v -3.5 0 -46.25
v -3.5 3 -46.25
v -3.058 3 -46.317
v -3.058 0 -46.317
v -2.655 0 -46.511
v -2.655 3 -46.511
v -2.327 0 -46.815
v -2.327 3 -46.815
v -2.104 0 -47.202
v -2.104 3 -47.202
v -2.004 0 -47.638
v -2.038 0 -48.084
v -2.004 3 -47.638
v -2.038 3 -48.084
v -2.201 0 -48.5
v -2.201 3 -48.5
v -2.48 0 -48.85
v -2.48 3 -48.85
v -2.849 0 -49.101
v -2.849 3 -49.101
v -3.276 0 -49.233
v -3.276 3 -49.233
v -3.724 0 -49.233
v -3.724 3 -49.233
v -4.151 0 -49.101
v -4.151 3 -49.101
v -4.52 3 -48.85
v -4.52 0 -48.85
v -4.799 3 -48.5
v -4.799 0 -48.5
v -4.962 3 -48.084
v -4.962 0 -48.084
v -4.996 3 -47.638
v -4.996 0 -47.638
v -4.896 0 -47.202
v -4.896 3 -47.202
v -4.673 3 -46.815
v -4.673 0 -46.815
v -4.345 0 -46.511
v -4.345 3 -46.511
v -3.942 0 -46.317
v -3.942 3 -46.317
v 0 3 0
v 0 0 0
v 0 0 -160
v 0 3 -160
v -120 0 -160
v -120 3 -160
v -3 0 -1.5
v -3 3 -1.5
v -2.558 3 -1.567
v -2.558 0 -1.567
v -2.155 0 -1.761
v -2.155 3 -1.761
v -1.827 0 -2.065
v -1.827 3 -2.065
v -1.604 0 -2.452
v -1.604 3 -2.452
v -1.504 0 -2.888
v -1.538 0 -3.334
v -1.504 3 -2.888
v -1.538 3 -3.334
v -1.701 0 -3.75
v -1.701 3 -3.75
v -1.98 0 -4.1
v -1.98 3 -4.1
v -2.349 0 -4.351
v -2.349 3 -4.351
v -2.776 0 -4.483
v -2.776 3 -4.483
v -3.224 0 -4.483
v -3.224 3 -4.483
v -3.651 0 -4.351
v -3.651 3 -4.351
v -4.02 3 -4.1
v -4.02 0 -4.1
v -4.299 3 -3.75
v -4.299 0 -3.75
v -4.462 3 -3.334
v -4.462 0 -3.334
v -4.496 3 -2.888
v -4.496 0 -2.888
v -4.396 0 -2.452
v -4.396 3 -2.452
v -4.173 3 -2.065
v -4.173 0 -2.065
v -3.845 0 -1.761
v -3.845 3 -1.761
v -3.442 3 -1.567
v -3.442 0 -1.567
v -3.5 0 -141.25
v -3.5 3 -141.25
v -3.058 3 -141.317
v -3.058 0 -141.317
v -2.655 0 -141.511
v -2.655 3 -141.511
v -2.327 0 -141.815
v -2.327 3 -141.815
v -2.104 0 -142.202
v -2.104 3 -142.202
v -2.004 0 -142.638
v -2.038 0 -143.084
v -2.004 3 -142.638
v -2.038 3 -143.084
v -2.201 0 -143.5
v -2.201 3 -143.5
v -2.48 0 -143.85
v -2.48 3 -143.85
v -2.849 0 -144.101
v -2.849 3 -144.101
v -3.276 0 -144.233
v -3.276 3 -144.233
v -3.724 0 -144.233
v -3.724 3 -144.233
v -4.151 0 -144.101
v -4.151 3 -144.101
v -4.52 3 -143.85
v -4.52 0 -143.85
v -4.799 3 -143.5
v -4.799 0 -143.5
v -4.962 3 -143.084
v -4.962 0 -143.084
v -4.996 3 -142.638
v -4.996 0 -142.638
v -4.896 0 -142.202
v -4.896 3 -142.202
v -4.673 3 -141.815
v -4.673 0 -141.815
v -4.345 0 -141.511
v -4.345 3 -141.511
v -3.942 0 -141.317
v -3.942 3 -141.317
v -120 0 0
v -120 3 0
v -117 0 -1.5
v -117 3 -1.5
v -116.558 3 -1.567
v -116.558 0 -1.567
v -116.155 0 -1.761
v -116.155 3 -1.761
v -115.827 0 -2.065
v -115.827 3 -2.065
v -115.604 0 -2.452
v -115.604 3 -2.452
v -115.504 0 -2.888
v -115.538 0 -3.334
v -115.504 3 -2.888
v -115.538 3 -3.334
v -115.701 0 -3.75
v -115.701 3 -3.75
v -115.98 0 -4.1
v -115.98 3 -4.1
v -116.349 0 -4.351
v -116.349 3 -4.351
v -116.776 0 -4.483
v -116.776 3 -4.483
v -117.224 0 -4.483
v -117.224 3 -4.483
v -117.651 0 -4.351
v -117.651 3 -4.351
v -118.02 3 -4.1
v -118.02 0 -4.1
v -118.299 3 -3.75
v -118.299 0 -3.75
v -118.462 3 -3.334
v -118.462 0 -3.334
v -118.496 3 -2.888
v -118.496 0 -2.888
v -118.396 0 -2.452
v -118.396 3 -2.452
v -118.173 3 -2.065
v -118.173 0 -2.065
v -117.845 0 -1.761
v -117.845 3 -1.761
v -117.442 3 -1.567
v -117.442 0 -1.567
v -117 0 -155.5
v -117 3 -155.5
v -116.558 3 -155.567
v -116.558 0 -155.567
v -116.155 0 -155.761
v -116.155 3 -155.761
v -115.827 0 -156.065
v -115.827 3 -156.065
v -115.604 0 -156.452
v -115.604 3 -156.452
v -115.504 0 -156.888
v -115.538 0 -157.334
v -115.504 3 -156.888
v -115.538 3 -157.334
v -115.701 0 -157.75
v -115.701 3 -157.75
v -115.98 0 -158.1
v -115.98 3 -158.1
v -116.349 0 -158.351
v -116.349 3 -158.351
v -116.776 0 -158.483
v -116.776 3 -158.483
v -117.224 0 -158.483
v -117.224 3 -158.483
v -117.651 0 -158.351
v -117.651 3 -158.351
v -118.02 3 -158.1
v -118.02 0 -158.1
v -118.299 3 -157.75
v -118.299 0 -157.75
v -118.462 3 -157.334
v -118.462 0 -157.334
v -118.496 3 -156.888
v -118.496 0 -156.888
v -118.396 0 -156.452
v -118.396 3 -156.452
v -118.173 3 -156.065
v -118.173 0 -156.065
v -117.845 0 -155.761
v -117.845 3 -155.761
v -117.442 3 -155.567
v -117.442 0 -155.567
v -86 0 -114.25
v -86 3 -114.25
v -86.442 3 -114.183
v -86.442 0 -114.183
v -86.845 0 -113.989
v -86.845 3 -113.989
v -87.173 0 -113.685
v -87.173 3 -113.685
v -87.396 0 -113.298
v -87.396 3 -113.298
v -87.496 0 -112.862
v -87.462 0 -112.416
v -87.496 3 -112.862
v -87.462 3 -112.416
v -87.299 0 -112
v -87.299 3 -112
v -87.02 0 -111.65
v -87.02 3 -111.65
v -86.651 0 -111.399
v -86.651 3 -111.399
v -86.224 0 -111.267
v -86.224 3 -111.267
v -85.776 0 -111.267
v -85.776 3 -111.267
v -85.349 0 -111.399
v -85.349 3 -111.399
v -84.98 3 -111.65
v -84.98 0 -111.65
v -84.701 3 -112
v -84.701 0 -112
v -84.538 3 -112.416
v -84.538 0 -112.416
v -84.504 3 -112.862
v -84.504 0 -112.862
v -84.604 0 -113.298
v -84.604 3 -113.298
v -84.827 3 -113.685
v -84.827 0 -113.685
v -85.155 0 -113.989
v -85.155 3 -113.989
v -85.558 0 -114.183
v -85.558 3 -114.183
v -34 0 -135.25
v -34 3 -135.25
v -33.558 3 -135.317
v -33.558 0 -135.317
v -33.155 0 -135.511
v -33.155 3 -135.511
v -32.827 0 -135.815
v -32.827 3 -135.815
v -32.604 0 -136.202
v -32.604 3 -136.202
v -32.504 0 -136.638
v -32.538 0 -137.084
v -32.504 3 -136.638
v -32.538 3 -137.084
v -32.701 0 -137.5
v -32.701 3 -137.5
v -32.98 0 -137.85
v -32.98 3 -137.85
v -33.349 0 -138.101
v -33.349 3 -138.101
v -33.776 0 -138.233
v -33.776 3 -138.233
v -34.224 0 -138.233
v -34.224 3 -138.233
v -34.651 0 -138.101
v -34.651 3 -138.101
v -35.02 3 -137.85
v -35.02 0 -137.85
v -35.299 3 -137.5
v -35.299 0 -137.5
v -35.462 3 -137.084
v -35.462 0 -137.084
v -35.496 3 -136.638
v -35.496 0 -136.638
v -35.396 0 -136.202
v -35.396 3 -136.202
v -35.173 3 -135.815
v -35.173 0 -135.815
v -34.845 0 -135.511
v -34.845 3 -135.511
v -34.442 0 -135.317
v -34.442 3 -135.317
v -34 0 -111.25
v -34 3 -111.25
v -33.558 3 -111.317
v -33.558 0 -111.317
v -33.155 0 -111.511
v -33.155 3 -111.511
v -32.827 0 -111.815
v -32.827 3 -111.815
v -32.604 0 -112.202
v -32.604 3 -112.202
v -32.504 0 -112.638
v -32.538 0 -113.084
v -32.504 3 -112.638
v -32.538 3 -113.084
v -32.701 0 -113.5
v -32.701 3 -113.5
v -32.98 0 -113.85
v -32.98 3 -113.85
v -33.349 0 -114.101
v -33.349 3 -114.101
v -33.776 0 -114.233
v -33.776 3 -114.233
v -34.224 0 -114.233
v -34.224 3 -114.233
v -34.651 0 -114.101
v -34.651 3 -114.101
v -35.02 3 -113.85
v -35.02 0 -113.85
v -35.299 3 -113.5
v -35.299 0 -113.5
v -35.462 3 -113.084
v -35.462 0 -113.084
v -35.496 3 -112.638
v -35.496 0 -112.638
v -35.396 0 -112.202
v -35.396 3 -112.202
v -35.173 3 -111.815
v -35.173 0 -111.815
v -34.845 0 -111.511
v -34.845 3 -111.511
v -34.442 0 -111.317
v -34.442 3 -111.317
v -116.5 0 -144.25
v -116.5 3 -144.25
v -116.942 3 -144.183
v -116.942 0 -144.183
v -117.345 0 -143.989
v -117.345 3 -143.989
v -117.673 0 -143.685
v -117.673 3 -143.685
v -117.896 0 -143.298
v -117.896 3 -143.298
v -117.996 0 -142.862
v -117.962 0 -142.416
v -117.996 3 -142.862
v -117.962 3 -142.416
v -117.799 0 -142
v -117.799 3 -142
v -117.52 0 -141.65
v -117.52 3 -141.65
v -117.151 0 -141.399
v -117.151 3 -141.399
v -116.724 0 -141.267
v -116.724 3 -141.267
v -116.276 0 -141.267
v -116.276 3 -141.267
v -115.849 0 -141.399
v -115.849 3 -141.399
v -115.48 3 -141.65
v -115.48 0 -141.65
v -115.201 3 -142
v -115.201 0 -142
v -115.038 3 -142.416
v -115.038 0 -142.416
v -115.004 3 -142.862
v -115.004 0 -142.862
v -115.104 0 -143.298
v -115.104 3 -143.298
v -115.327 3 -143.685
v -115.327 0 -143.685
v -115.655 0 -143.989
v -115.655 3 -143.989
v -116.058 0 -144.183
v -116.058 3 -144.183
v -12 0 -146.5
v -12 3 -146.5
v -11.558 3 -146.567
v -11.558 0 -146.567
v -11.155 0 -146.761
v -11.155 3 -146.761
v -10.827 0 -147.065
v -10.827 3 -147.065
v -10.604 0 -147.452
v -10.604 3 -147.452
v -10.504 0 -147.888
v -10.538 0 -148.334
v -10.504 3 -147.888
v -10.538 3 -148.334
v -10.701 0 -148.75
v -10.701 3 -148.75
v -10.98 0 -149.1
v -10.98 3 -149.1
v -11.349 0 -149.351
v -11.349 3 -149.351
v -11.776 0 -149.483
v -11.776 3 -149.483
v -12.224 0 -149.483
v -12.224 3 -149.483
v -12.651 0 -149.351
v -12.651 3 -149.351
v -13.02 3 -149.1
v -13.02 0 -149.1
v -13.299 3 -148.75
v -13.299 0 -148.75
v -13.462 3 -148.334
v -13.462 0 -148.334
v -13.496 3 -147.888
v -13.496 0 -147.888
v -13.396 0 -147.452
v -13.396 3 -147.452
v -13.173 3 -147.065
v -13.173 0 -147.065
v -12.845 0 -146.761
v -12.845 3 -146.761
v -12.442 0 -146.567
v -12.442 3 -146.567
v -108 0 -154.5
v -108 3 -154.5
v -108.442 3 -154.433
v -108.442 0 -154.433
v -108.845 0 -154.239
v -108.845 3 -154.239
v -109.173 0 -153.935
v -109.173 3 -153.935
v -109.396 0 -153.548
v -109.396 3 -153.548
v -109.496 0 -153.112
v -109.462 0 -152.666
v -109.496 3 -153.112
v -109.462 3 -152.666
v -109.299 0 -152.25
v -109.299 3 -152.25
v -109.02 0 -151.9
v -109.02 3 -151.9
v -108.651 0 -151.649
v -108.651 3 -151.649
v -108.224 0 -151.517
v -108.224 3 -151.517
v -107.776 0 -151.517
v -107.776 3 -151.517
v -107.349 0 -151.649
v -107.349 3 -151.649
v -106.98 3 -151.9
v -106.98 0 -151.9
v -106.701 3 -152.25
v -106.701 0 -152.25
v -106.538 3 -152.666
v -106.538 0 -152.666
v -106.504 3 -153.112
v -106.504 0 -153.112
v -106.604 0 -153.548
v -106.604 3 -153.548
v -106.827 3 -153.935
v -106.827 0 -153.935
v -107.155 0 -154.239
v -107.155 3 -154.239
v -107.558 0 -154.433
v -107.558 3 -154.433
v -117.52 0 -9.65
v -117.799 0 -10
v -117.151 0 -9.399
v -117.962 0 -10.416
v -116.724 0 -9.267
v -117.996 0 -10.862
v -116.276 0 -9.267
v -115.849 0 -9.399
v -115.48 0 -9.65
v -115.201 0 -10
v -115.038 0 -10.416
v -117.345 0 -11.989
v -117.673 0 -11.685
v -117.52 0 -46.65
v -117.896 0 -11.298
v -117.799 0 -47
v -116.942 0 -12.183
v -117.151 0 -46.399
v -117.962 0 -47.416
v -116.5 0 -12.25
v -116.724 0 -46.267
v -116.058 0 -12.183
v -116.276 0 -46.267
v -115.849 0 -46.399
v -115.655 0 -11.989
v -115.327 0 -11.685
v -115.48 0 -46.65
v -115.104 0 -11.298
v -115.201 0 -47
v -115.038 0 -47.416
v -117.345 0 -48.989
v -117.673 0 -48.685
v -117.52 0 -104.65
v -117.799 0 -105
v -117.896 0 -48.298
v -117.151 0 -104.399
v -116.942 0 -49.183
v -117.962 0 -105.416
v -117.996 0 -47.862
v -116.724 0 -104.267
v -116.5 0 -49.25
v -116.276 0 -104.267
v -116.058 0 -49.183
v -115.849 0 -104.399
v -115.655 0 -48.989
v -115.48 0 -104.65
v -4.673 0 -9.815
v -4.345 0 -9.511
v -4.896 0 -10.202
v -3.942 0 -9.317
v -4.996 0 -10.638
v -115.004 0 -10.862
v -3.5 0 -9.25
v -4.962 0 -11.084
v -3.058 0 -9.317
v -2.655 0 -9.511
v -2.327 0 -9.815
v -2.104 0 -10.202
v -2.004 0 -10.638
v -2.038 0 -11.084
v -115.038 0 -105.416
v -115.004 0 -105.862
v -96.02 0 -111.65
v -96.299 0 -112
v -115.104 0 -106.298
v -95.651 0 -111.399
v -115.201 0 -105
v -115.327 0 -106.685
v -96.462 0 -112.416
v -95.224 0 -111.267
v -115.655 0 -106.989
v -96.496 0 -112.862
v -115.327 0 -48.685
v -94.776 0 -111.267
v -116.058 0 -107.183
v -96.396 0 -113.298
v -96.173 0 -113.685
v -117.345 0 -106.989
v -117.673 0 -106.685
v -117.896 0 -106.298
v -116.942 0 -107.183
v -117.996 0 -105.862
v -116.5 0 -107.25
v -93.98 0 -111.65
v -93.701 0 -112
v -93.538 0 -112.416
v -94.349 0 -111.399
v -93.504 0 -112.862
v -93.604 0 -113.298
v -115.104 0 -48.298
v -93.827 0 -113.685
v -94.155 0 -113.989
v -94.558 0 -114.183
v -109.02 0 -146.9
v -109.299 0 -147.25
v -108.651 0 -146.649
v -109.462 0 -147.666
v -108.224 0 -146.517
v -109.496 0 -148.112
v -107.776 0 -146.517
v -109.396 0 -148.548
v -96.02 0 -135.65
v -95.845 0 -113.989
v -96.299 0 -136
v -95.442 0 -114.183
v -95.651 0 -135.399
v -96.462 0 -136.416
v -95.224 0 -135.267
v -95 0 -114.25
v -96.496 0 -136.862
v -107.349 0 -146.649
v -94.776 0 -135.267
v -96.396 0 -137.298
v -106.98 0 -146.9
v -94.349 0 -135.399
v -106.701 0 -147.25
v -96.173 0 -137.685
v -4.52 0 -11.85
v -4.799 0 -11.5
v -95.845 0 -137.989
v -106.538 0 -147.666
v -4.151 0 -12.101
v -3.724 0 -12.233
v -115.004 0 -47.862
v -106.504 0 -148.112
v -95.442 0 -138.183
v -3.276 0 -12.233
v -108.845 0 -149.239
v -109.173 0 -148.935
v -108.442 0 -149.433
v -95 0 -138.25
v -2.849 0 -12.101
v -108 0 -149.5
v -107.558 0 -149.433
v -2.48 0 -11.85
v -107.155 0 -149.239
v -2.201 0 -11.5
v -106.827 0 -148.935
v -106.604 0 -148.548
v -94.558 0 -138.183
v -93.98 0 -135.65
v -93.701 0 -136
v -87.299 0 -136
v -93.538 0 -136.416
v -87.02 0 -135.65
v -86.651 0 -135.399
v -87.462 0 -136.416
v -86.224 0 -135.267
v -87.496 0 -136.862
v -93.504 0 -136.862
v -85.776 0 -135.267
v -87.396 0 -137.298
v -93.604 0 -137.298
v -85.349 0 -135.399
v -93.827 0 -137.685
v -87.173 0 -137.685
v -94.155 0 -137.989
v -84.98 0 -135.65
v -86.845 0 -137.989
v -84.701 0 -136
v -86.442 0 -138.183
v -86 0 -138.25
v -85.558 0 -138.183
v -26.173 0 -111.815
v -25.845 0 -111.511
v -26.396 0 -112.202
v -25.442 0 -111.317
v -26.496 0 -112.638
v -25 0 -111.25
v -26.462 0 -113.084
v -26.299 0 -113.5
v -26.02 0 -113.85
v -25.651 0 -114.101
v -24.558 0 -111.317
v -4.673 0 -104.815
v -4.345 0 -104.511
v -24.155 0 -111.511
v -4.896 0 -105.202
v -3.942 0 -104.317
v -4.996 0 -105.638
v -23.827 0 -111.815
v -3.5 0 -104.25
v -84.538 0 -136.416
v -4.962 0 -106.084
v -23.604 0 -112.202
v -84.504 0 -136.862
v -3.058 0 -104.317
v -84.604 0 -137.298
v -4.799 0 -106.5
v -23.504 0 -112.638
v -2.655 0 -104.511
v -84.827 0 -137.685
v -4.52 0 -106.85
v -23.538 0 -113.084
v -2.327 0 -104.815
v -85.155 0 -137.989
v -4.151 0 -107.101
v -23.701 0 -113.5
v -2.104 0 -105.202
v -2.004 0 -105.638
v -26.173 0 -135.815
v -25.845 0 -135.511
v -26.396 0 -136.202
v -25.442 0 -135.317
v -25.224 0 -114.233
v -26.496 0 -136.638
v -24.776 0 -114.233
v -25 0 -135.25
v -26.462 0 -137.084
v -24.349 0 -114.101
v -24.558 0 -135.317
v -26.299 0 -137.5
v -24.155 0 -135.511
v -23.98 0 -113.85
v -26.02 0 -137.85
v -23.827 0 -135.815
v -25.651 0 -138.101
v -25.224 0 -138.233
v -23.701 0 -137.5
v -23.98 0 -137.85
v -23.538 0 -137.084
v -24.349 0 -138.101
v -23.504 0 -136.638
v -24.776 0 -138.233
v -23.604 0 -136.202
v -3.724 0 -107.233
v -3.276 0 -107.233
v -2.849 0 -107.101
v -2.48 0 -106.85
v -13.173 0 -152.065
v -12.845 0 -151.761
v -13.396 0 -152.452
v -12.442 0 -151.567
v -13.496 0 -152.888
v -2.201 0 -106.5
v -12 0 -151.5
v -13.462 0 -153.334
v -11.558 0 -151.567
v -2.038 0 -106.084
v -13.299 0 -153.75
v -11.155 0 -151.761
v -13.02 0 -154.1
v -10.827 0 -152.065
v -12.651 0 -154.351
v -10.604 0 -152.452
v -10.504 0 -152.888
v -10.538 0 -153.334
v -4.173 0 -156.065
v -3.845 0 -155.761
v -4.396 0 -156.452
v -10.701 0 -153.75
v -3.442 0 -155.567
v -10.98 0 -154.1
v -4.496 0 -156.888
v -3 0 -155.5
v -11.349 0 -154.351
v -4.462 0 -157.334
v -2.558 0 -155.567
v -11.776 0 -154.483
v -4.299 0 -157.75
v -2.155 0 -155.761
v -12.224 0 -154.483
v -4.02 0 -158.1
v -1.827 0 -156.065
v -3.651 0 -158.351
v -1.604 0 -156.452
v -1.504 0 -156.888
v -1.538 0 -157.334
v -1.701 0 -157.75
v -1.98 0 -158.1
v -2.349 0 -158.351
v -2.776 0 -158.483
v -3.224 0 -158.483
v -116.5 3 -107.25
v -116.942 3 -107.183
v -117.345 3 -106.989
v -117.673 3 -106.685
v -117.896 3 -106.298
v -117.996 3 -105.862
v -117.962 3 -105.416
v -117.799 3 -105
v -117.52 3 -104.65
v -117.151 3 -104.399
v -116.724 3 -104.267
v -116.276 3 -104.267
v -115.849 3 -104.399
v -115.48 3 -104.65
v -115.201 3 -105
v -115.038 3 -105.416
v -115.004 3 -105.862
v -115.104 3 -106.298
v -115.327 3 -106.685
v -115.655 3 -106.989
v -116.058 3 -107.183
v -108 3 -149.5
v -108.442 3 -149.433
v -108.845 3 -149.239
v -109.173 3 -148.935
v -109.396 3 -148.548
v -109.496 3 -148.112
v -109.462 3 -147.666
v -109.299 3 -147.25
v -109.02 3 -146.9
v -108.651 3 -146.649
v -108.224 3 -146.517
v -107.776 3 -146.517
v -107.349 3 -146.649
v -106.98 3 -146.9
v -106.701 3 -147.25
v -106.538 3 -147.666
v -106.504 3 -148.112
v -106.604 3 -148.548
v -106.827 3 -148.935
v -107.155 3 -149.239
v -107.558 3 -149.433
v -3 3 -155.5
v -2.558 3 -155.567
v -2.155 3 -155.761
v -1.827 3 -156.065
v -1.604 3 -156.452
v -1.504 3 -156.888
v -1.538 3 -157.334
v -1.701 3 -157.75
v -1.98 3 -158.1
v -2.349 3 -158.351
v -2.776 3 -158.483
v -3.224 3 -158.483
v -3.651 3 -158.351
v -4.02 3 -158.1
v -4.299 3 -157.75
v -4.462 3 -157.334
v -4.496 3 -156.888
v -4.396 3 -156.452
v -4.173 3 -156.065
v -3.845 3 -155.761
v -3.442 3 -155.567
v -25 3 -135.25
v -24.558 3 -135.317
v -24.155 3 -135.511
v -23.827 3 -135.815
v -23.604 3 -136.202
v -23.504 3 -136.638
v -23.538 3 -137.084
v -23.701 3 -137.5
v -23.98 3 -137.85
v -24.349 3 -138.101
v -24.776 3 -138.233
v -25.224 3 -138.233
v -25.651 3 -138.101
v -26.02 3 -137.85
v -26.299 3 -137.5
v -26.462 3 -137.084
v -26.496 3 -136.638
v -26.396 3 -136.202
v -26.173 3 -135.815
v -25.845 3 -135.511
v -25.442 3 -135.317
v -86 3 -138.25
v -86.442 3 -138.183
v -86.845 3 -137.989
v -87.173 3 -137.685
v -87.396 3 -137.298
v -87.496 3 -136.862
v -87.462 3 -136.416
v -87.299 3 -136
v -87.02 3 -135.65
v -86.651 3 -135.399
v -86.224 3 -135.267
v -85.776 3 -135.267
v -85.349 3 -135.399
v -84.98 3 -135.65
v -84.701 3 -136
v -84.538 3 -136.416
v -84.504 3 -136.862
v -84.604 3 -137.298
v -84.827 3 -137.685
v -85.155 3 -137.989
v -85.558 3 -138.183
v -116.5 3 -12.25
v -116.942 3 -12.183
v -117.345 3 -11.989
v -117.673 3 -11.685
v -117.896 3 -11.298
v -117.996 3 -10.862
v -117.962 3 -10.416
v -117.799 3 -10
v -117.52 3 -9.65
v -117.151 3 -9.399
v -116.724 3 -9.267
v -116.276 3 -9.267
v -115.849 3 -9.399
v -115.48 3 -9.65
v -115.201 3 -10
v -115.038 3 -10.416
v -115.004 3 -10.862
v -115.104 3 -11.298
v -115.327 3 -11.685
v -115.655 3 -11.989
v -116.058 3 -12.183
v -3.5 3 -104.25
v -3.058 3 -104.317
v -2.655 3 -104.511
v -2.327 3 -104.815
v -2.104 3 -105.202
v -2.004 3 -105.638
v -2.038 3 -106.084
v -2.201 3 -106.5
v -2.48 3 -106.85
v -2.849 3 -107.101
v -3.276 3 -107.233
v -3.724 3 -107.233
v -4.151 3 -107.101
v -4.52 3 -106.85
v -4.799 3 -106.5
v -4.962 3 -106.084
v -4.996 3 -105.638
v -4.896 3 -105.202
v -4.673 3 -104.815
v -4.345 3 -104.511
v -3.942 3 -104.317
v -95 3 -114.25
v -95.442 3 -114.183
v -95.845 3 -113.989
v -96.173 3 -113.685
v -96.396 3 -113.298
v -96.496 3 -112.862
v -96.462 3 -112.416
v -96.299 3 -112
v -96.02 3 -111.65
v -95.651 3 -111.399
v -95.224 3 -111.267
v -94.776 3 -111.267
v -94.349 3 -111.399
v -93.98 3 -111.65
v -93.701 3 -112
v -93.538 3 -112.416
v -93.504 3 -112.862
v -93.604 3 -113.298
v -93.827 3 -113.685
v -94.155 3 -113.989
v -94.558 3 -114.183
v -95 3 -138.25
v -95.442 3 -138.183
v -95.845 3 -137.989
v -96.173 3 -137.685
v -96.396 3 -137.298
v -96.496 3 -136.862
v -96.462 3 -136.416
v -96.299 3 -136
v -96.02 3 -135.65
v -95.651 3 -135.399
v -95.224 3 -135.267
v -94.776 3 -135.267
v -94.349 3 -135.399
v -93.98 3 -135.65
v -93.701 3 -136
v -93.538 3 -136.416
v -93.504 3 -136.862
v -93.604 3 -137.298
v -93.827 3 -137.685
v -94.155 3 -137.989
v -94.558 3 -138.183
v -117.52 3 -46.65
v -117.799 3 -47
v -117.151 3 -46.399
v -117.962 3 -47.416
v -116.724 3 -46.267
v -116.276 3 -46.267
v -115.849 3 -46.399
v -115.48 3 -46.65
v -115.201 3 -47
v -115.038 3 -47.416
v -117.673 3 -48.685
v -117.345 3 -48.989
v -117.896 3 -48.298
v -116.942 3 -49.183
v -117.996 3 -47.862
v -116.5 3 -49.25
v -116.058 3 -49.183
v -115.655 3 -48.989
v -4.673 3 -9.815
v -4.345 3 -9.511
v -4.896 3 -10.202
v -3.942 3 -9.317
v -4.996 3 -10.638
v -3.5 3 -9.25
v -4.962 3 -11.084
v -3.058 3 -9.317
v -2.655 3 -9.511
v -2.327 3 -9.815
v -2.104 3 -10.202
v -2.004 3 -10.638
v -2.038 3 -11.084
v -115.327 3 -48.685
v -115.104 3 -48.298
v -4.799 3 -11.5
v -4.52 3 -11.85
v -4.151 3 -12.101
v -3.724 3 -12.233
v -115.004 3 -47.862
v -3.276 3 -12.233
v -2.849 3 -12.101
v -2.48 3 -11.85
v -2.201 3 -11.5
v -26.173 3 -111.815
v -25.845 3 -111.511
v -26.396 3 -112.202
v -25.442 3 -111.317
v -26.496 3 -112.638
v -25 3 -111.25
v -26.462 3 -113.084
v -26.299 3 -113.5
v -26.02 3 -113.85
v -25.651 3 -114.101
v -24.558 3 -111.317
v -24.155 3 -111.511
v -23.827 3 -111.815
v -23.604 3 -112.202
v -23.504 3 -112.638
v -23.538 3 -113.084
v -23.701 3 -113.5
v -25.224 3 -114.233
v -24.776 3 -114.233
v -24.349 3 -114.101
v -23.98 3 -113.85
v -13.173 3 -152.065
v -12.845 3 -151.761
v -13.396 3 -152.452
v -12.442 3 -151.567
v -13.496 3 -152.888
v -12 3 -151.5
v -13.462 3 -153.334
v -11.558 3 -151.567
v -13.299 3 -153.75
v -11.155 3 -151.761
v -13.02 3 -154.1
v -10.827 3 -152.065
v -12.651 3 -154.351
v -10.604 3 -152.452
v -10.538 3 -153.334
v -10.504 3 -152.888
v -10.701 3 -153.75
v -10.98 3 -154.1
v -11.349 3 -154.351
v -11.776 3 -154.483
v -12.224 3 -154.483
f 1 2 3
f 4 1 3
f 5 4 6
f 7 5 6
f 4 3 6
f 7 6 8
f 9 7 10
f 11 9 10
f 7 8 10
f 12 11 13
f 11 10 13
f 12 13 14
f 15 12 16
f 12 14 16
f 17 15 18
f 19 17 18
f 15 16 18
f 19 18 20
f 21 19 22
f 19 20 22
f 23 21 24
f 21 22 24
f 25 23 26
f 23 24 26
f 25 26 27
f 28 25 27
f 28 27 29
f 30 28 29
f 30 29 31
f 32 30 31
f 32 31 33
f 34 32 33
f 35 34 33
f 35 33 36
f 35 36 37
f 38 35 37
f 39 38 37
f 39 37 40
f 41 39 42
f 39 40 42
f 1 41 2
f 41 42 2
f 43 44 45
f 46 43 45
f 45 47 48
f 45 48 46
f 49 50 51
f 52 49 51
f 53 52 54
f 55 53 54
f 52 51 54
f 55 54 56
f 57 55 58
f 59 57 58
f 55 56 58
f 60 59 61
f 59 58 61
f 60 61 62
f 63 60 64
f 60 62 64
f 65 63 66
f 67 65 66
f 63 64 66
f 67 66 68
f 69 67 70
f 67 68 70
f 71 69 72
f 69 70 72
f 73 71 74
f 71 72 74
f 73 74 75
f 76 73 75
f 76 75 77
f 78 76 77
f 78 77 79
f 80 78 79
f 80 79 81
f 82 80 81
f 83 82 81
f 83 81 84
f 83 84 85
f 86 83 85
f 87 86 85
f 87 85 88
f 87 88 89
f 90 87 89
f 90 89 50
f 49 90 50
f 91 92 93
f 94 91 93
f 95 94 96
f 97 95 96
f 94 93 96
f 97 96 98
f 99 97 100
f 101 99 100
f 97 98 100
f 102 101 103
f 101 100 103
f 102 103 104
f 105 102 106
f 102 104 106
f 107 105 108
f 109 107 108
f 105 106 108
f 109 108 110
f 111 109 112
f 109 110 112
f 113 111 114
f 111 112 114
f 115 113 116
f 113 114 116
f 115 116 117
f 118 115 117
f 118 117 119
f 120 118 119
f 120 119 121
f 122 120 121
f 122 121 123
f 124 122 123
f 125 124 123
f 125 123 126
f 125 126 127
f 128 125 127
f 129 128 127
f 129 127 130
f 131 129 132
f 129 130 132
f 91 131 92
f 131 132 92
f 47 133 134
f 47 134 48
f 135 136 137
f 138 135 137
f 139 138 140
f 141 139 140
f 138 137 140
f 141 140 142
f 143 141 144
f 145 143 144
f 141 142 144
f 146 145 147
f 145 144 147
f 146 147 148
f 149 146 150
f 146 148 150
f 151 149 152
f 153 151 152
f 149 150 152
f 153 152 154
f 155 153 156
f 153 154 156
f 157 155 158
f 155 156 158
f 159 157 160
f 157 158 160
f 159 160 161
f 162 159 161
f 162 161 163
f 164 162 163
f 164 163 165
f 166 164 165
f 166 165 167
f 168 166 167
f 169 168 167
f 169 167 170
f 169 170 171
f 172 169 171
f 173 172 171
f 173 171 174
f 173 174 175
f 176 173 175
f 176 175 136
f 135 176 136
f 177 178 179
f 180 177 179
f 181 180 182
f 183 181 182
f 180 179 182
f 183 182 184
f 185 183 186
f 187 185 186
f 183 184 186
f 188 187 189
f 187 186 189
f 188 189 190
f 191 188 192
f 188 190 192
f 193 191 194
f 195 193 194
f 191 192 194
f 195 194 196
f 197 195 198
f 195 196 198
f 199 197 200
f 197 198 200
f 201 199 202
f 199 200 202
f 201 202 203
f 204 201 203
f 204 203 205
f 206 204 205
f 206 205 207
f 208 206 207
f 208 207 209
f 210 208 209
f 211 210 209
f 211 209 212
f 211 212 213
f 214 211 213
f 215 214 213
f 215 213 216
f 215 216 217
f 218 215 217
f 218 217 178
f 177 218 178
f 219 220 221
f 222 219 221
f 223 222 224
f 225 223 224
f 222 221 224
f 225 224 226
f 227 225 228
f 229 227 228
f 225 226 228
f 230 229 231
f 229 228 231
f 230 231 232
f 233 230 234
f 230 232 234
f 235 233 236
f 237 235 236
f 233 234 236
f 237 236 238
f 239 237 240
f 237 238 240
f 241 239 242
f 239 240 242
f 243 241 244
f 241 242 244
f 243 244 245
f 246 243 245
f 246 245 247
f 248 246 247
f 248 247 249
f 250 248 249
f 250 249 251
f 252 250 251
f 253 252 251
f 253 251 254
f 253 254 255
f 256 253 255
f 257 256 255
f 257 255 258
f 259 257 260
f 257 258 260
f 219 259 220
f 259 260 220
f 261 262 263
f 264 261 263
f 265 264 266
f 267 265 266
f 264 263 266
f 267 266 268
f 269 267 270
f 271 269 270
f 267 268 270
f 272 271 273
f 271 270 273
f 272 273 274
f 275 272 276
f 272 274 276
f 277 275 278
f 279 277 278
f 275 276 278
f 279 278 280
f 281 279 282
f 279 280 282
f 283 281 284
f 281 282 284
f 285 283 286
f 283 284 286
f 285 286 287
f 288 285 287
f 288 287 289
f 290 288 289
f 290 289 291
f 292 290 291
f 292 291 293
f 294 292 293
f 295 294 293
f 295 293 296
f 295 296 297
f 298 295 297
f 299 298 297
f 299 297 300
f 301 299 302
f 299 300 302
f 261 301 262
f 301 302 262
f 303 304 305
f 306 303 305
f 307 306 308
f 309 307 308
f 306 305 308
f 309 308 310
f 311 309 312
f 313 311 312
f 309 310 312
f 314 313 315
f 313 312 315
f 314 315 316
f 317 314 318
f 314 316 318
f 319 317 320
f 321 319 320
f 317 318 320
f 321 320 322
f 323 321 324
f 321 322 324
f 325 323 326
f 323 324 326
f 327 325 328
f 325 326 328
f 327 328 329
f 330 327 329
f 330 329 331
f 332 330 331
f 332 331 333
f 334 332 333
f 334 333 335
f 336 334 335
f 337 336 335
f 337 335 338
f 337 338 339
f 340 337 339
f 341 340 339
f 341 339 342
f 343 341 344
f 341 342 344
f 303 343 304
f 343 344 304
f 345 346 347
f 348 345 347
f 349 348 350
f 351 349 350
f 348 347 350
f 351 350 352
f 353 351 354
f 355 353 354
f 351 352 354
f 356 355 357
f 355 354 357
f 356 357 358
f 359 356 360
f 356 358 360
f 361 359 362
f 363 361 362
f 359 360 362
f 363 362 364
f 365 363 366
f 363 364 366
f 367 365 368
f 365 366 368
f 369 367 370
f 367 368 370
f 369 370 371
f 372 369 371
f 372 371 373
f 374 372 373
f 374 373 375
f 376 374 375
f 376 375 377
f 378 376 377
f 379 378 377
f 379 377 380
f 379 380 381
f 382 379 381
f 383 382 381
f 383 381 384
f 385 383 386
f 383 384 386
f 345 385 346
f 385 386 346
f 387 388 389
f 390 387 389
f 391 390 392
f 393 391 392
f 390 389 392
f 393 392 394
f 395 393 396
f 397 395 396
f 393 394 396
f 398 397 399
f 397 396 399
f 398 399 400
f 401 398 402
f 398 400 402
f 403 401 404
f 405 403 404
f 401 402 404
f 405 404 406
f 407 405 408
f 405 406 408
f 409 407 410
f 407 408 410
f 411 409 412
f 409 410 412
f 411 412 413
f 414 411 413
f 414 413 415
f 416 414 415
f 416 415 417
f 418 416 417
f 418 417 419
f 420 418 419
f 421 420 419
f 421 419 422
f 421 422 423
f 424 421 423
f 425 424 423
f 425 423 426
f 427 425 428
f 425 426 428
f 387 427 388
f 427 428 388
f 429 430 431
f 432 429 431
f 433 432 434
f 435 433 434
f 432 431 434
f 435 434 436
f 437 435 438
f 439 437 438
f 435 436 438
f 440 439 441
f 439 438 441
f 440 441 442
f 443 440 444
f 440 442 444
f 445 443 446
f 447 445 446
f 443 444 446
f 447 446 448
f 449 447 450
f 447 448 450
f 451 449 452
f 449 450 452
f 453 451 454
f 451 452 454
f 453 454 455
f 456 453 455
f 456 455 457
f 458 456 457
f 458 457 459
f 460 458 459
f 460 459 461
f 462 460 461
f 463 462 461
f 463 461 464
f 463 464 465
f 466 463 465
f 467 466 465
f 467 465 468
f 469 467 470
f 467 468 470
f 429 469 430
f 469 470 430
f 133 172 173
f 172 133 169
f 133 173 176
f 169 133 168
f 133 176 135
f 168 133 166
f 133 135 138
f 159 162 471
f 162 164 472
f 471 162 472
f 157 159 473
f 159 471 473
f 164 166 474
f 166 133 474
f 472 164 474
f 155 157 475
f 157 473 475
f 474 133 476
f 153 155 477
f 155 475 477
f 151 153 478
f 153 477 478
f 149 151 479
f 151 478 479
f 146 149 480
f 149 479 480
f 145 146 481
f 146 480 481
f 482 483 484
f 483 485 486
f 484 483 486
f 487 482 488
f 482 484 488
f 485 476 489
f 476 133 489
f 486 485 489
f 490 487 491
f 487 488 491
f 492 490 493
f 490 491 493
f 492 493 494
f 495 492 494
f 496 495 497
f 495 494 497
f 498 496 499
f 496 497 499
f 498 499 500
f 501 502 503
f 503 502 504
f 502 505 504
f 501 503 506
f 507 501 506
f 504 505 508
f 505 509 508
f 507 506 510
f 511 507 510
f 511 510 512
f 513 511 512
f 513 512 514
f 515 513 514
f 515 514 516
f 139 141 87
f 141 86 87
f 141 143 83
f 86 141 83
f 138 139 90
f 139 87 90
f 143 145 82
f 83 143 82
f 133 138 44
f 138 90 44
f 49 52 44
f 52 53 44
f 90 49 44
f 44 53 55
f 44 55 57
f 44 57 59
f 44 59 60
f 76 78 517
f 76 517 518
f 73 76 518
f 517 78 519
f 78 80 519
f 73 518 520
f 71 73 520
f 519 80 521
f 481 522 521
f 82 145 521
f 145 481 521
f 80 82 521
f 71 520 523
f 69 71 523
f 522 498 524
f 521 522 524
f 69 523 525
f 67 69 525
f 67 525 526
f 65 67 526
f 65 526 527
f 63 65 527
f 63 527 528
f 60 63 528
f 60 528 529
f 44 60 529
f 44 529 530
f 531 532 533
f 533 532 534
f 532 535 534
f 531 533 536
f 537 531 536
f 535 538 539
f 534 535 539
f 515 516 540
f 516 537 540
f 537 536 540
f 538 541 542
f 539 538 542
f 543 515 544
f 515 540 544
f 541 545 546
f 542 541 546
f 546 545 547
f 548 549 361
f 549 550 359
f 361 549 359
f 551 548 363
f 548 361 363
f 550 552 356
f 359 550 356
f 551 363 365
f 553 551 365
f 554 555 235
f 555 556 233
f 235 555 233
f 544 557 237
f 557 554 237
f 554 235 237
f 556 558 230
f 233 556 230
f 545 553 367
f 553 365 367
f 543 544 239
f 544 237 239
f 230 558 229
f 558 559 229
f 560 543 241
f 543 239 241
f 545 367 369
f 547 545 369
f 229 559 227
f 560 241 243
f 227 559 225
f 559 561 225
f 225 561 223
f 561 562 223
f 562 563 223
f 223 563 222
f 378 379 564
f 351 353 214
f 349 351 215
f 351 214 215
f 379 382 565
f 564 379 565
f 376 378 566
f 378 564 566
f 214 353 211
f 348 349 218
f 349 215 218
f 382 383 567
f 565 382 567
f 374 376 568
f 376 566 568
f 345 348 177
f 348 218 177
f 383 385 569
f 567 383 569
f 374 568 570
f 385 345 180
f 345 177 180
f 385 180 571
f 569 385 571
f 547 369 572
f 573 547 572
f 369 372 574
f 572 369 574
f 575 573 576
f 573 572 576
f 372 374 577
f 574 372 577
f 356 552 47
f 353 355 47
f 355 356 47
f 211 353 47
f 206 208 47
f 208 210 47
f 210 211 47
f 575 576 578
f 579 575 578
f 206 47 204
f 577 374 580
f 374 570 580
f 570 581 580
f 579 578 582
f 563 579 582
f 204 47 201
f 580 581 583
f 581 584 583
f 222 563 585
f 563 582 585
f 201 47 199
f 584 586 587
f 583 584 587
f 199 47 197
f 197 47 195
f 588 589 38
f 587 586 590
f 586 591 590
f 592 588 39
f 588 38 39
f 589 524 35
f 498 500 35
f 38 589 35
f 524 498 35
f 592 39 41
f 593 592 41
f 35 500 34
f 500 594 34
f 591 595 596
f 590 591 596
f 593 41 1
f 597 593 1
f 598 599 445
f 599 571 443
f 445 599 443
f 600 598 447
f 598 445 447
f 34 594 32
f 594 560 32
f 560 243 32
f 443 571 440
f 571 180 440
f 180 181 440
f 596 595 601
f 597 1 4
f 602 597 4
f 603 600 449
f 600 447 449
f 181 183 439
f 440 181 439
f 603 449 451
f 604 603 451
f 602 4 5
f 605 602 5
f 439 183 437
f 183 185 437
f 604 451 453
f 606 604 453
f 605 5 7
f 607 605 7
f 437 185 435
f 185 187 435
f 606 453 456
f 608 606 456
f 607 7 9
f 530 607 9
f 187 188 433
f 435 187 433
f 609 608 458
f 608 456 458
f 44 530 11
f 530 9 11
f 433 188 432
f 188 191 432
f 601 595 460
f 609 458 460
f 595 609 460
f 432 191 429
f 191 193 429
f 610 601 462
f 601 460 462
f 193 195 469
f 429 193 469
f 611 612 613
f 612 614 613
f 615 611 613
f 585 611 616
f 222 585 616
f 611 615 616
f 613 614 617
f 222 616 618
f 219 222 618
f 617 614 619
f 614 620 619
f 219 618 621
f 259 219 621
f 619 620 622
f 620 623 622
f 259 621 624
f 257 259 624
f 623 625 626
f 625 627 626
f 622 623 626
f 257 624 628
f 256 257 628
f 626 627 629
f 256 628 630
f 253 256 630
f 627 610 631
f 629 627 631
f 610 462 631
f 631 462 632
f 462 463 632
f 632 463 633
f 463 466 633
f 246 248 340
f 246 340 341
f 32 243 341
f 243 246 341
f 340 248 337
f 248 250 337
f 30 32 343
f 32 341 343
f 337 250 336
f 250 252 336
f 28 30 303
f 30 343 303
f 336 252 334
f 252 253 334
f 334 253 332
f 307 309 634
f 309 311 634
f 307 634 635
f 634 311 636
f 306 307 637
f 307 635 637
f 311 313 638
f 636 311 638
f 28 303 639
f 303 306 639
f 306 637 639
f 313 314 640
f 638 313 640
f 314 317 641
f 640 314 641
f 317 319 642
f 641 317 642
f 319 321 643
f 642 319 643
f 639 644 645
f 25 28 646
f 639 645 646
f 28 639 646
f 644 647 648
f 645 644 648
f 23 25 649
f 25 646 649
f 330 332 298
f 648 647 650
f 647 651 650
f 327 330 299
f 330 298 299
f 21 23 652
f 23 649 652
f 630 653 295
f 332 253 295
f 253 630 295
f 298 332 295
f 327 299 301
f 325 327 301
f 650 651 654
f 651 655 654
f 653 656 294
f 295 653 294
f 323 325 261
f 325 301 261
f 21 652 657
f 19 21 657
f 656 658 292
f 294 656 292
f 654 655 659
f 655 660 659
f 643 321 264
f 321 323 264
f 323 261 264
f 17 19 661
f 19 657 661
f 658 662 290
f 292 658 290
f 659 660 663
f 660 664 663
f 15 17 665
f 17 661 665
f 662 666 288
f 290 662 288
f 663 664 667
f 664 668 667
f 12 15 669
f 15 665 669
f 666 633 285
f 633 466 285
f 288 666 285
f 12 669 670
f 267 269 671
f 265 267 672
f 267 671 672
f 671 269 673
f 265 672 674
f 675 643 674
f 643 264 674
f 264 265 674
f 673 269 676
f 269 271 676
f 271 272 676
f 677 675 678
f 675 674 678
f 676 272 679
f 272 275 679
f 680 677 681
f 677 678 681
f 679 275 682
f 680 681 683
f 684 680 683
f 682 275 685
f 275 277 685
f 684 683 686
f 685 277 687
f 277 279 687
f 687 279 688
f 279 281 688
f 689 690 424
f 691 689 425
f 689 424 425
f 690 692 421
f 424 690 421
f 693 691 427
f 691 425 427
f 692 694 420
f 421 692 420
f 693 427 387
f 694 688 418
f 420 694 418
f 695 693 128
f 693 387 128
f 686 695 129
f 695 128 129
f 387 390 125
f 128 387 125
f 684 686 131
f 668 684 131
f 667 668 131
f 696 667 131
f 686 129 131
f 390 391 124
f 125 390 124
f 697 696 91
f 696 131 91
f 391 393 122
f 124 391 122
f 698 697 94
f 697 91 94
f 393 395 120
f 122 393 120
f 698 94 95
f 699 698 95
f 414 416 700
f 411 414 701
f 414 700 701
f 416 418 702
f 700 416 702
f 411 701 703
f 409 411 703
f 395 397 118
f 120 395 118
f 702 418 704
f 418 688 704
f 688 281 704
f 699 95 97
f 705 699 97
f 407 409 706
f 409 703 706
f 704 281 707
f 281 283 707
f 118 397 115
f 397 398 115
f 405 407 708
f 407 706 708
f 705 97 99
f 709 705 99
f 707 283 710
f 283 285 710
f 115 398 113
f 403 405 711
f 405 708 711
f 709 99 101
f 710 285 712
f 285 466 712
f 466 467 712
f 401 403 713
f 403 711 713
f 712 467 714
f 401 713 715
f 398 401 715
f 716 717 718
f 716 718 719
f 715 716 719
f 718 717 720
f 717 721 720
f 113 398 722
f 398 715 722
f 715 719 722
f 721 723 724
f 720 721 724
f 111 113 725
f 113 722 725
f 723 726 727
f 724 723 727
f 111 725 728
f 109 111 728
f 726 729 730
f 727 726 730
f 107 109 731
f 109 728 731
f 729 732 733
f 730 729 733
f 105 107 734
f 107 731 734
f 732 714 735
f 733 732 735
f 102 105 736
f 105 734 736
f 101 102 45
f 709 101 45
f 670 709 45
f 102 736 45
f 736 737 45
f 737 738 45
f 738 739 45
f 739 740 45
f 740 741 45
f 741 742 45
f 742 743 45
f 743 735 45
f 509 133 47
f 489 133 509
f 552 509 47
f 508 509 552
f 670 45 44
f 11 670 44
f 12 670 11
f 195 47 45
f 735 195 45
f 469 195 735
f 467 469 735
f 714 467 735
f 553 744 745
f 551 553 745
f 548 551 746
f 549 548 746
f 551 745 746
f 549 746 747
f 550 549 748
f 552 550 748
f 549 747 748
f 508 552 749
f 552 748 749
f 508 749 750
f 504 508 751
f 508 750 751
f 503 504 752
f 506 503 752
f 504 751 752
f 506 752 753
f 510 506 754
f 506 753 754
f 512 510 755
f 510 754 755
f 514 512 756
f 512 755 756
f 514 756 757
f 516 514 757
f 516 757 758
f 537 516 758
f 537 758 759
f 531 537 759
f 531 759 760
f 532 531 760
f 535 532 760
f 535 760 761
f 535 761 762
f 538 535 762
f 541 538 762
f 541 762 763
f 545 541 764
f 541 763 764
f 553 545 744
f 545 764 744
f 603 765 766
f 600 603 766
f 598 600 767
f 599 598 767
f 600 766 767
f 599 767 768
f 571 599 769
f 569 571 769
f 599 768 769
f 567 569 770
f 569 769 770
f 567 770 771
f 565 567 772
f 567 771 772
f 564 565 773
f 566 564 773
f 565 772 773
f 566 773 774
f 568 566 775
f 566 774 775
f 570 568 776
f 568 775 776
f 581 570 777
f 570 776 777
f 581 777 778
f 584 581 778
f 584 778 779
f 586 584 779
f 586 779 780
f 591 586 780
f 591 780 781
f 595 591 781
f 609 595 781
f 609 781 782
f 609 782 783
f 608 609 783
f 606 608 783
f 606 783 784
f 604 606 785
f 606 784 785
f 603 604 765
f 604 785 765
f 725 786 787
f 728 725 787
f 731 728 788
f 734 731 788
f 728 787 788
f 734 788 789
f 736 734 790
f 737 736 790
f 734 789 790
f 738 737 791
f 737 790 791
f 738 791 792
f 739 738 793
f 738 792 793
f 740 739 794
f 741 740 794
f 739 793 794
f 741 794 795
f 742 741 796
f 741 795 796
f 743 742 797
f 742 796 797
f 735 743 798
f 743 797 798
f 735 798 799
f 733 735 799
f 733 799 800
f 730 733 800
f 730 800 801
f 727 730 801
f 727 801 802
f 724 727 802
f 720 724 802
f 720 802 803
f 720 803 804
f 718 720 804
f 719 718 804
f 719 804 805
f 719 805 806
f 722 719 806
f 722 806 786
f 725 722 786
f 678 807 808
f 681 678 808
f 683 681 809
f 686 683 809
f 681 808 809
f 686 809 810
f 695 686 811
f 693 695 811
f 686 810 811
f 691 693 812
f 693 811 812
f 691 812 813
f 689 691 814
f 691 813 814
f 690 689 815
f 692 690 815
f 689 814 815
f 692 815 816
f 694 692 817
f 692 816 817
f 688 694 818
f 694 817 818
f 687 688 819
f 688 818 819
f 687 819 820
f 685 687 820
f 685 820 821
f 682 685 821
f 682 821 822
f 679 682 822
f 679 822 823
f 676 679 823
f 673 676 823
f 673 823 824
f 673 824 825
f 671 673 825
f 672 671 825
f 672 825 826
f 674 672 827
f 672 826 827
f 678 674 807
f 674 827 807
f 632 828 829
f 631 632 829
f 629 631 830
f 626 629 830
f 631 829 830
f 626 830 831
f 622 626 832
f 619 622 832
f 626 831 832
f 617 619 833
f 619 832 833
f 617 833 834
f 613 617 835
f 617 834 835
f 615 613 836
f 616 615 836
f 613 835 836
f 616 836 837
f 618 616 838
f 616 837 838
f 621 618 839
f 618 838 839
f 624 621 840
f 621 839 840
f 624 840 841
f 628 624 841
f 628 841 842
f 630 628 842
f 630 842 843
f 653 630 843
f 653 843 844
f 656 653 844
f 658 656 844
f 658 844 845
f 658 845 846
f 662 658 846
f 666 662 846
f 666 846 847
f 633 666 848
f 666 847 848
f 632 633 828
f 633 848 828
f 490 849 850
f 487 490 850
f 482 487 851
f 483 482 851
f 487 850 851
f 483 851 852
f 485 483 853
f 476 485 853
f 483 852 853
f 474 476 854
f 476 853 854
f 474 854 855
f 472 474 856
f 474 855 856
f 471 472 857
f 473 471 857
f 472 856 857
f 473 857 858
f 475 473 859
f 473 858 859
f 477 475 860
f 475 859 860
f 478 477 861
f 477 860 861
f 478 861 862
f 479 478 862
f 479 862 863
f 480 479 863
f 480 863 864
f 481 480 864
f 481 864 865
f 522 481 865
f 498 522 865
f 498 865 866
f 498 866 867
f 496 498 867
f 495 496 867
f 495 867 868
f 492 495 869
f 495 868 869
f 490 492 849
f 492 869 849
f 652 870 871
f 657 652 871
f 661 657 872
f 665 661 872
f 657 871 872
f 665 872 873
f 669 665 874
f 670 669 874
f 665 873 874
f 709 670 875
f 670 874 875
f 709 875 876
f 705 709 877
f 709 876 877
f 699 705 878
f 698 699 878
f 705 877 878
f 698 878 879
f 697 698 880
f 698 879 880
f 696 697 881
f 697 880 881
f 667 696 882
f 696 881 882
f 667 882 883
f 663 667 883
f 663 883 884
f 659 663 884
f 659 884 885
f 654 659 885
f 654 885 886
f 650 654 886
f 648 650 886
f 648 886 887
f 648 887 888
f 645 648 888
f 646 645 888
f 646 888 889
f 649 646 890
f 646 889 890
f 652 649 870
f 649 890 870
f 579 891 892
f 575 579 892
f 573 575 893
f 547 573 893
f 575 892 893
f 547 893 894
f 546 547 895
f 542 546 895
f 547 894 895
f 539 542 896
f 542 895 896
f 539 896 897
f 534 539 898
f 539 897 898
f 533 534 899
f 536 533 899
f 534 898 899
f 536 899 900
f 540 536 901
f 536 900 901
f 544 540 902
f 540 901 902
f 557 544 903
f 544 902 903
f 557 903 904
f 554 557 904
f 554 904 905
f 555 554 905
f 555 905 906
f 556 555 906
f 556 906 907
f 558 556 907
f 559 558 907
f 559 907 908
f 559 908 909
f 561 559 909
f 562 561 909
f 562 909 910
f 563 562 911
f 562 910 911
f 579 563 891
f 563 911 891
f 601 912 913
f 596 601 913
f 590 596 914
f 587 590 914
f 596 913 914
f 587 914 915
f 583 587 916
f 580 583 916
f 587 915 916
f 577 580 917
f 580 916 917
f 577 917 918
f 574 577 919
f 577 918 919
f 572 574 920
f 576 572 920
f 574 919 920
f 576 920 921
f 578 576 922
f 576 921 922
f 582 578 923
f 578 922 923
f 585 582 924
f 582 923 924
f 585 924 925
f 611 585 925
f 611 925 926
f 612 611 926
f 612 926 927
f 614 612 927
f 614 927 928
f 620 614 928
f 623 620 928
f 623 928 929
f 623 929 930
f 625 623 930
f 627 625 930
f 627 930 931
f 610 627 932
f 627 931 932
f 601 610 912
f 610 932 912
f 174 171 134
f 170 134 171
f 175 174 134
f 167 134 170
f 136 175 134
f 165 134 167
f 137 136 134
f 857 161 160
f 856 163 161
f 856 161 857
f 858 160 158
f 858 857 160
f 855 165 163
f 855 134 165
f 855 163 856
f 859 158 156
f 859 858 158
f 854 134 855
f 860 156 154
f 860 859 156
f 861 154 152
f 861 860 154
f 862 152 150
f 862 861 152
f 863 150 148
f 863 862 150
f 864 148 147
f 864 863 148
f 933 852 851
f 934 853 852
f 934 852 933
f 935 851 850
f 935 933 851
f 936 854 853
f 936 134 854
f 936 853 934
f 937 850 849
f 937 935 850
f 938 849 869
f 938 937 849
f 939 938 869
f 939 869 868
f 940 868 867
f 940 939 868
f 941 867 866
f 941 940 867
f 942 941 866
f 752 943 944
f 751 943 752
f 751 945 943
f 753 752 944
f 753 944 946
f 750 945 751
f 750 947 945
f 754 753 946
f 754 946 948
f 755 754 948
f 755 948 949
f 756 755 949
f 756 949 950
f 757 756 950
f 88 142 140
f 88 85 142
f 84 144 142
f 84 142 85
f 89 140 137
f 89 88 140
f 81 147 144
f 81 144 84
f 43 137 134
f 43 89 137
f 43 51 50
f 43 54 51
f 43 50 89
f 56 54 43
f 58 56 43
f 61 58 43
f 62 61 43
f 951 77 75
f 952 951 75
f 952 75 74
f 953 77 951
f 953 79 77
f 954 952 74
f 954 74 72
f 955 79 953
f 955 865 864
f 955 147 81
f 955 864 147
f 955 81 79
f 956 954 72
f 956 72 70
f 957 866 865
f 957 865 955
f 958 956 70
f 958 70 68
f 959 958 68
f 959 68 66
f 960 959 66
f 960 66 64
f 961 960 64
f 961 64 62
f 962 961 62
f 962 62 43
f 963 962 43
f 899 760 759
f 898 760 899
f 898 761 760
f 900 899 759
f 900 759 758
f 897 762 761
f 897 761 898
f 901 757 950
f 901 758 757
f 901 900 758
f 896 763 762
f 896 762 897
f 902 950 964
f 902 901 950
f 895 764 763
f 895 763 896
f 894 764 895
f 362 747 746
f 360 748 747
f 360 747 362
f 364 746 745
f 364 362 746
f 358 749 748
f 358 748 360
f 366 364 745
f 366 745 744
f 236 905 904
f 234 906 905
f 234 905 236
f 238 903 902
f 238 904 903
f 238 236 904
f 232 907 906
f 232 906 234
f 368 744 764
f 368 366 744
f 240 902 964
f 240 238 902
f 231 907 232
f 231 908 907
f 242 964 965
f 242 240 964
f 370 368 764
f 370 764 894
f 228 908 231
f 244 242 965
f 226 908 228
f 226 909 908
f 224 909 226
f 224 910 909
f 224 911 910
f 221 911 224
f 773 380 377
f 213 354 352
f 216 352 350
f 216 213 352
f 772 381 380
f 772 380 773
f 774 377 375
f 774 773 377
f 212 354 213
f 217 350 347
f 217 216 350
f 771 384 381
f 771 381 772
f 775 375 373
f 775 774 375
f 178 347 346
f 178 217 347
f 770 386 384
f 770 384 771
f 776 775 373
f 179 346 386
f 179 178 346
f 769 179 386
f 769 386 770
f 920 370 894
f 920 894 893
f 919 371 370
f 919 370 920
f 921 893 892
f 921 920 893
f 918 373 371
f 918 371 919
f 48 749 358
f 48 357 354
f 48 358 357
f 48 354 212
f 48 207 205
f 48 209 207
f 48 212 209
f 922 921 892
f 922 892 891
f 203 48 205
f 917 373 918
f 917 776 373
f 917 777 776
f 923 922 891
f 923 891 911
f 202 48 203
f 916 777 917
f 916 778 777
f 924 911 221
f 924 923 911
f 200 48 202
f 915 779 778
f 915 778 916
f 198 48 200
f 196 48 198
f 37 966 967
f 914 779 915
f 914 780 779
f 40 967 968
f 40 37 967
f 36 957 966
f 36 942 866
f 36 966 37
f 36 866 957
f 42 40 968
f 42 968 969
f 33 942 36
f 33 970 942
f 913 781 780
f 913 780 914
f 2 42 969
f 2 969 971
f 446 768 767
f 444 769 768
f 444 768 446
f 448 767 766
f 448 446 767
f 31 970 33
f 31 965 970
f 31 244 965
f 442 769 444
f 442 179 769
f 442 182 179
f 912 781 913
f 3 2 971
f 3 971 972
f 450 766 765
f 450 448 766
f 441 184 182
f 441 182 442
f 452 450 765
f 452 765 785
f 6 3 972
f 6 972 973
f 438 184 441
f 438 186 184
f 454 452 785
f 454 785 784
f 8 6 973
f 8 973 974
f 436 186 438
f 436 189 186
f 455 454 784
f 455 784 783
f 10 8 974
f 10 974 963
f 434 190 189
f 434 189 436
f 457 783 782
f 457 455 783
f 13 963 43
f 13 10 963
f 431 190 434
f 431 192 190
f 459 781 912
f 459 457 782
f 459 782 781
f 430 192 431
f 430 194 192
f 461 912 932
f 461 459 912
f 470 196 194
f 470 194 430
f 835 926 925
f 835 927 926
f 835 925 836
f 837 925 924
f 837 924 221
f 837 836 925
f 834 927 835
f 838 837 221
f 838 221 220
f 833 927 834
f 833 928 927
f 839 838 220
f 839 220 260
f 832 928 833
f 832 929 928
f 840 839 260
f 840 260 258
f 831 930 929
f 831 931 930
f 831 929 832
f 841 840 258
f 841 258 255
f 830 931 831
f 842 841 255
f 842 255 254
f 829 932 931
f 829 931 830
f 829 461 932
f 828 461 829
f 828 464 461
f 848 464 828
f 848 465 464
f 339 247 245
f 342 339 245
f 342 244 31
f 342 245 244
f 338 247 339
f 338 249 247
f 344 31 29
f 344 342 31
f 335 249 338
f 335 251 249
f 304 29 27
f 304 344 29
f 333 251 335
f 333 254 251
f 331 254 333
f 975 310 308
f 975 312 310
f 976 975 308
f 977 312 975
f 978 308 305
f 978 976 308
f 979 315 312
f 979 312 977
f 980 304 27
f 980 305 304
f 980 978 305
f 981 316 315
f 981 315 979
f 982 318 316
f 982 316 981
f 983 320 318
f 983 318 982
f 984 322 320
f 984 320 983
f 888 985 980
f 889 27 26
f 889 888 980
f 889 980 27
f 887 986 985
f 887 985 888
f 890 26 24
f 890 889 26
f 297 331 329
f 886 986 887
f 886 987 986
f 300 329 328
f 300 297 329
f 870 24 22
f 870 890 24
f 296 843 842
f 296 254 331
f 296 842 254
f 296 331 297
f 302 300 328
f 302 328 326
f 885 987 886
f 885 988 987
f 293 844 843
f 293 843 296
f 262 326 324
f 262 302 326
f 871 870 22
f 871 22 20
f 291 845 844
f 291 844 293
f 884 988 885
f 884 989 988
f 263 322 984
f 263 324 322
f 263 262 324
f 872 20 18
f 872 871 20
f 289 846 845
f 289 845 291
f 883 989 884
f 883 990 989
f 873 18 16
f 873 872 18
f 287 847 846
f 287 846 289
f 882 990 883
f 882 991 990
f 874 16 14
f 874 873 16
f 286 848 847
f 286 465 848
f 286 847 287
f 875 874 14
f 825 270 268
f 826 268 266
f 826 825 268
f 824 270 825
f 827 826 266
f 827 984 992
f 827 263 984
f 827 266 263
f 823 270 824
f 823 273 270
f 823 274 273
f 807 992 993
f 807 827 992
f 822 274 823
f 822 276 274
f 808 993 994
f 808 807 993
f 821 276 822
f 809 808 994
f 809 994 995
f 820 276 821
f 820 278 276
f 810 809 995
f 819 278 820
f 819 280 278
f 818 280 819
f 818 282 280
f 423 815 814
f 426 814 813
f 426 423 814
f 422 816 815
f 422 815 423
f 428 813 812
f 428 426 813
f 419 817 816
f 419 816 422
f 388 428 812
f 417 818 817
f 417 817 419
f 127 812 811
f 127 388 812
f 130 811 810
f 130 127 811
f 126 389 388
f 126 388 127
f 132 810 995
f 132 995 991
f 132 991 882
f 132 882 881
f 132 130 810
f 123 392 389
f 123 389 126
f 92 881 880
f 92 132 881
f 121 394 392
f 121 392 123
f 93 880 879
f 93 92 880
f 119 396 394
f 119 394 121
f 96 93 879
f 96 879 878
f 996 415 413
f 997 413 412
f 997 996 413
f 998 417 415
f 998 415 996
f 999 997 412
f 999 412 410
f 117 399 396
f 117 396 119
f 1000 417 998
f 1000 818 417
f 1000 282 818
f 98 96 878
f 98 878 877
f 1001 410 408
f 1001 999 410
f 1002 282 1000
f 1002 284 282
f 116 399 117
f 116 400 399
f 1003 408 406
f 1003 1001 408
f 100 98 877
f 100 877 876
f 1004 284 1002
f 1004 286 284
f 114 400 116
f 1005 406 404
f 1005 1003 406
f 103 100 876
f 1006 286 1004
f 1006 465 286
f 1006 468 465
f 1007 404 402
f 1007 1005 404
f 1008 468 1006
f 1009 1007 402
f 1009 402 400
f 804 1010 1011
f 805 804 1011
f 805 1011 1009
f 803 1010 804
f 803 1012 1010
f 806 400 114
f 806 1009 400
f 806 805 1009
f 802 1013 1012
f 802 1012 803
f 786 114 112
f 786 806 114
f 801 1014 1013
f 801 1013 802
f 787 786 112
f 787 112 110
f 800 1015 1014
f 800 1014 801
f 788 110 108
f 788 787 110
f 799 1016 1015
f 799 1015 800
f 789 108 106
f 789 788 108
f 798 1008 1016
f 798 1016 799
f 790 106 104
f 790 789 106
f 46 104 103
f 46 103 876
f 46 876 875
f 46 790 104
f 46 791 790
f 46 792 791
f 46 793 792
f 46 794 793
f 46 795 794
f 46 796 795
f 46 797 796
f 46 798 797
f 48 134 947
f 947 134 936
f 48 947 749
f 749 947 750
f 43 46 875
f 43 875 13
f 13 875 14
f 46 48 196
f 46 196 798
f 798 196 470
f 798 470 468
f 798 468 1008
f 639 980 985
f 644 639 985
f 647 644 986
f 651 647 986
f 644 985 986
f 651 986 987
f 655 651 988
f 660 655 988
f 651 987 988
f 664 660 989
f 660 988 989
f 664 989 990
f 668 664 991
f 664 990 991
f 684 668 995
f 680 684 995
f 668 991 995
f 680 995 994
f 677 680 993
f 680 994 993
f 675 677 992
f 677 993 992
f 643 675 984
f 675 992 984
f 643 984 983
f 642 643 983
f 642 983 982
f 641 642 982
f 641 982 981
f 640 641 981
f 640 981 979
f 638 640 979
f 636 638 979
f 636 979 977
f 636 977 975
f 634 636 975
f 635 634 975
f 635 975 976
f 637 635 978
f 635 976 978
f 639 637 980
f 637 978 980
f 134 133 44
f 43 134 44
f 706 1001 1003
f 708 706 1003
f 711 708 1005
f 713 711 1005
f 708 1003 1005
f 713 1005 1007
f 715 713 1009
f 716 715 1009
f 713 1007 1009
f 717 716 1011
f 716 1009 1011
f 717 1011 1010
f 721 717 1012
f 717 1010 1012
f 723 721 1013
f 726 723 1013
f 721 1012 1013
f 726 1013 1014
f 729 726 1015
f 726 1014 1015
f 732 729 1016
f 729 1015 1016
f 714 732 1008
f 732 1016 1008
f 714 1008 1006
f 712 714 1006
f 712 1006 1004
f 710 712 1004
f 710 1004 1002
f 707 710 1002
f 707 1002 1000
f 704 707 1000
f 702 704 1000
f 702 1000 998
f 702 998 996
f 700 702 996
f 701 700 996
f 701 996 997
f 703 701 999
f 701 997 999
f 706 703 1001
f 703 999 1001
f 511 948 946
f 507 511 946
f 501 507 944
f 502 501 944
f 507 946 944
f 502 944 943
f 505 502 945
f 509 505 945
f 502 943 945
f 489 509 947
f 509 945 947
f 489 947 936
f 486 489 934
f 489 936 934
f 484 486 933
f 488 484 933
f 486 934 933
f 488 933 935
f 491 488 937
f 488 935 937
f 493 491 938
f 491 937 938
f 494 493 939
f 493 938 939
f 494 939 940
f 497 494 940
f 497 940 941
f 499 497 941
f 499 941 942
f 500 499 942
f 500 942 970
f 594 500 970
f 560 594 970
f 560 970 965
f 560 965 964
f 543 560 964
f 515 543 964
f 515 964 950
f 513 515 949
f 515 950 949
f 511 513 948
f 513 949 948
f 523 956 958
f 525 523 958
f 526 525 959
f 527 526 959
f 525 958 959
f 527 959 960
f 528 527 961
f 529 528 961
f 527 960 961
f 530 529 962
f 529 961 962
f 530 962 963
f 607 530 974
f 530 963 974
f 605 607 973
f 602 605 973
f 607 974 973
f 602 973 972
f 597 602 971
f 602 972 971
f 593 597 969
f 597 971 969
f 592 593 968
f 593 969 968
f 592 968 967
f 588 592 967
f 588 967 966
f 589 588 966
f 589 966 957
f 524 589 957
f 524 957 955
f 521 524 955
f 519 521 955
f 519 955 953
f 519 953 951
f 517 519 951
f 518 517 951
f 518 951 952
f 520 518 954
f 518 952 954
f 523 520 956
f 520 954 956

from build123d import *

# Parameters (mm, degrees)
SKETCH1_W           = 120
SKETCH1_H           = 160
BOSS_EXTRUDE1_DEPTH = 3
SKETCH2_R           = 1.5
CUT_EXTRUDE12_DEPTH = 3
SKETCH3_R           = 1.5
CUT_EXTRUDE13_DEPTH = 10


with BuildPart() as part:
    # Sketch1 → Boss-Extrude1 (new body)
    with BuildSketch(Plane(origin=(0, 0, 0), x_dir=(1, 0, 0), z_dir=(0, 1, 0))):
        with Locations((-60, 80)):
            Rectangle(SKETCH1_W, SKETCH1_H)
    extrude(amount=BOSS_EXTRUDE1_DEPTH)

    # Sketch2 → Cut-Extrude12 (cut)
    with BuildSketch(Plane(origin=(0, 3, 0), x_dir=(1, 0, 0), z_dir=(0, 1, 0))):
        with Locations(Location((-25, 112.75, 0), (0, 0, 270))):
            Circle(SKETCH2_R)
        with Locations(Location((-3.5, 105.75, 0), (0, 0, 270))):
            Circle(SKETCH2_R)
        with Locations(Location((-34, 136.75, 0), (0, 0, 270))):
            Circle(SKETCH2_R)
        with Locations(Location((-25, 136.75, 0), (0, 0, 270))):
            Circle(SKETCH2_R)
        with Locations(Location((-34, 112.75, 0), (0, 0, 270))):
            Circle(SKETCH2_R)
        with Locations(Location((-3.5, 142.75, 0), (0, 0, 270))):
            Circle(SKETCH2_R)
        with Locations(Location((-12, 148, 0), (0, 0, 270))):
            Circle(SKETCH2_R)
        with Locations(Location((-12, 153, 0), (0, 0, 270))):
            Circle(SKETCH2_R)
        with Locations(Location((-108, 153, 0), (0, 0, 90))):
            Circle(SKETCH2_R)
        with Locations(Location((-108, 148, 0), (0, 0, 90))):
            Circle(SKETCH2_R)
        with Locations(Location((-116.5, 142.75, 0), (0, 0, 90))):
            Circle(SKETCH2_R)
        with Locations(Location((-95, 136.75, 0), (0, 0, 90))):
            Circle(SKETCH2_R)
        with Locations(Location((-86, 136.75, 0), (0, 0, 90))):
            Circle(SKETCH2_R)
        with Locations(Location((-86, 112.75, 0), (0, 0, 90))):
            Circle(SKETCH2_R)
        with Locations(Location((-95, 112.75, 0), (0, 0, 90))):
            Circle(SKETCH2_R)
        with Locations(Location((-116.5, 105.75, 0), (0, 0, 90))):
            Circle(SKETCH2_R)
        with Locations(Location((-3.5, 47.75, 0), (0, 0, 270))):
            Circle(SKETCH2_R)
        with Locations(Location((-3.5, 10.75, 0), (0, 0, 270))):
            Circle(SKETCH2_R)
        with Locations(Location((-116.5, 47.75, 0), (0, 0, 90))):
            Circle(SKETCH2_R)
        with Locations(Location((-116.5, 10.75, 0), (0, 0, 90))):
            Circle(SKETCH2_R)
    extrude(amount=-CUT_EXTRUDE12_DEPTH, mode=Mode.SUBTRACT)

    # Sketch3 → Cut-Extrude13 (cut)
    with BuildSketch(Plane(origin=(0, 3, 0), x_dir=(1, 0, 0), z_dir=(0, 1, 0))):
        with Locations(Location((-117, 157, 0), (0, 0, 270))):
            Circle(SKETCH3_R)
        with Locations(Location((-3, 157, 0), (0, 0, 270))):
            Circle(SKETCH3_R)
        with Locations(Location((-117, 3, 0), (0, 0, 270))):
            Circle(SKETCH3_R)
        with Locations(Location((-3, 3, 0), (0, 0, 270))):
            Circle(SKETCH3_R)
    extrude(amount=-CUT_EXTRUDE13_DEPTH, mode=Mode.SUBTRACT)


solid = part.part
